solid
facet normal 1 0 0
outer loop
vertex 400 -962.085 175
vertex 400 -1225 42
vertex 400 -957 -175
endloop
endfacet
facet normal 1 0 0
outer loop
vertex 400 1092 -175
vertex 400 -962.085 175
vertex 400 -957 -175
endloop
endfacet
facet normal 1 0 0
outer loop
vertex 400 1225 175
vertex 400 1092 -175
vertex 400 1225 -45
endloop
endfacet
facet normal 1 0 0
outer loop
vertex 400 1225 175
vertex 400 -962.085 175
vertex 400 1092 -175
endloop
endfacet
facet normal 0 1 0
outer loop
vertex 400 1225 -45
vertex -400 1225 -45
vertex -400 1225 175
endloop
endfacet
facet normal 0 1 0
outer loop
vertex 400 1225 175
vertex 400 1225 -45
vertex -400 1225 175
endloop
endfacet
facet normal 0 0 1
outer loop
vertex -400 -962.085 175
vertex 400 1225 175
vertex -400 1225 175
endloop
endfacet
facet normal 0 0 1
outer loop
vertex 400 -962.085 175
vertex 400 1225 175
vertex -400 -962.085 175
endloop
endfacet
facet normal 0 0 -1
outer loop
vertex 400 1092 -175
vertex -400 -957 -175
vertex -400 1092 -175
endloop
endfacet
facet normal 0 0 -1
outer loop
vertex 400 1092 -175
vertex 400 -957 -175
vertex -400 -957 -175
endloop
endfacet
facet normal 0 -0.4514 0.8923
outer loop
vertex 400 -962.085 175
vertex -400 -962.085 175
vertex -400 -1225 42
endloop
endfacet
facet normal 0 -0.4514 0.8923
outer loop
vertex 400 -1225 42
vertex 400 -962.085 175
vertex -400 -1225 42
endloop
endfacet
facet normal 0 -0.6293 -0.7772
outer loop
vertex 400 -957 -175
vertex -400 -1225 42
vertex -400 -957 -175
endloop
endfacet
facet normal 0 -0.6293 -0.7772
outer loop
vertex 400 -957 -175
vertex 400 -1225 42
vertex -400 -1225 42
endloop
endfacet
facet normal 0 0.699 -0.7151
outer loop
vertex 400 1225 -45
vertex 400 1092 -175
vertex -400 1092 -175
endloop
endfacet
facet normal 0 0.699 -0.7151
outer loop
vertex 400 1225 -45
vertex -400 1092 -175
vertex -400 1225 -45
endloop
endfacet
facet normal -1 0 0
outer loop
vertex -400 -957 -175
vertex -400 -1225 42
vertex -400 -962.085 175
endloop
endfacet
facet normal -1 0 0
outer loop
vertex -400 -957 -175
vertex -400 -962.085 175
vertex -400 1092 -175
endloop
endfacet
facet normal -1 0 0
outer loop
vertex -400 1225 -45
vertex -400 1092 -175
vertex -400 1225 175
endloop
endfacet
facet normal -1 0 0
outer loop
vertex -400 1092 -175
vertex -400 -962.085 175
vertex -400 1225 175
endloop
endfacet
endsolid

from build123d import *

# Parameters (mm, degrees)
F1_DEPTH      = 400
F1_DEPTH_BACK = 400


with BuildPart() as f1:
    # F0 (on Right) → F1 (new body, two sides)
    with BuildSketch(Plane.YZ) as f1_sk:
        Polygon((-957, -175), (1092, -175), (1225, -45), (1225, 175), (-962.085426, 175), (-1225, 42), align=None)
    extrude(amount=F1_DEPTH)
    extrude(f1_sk.sketch, amount=-F1_DEPTH_BACK)


solid = f1.part
